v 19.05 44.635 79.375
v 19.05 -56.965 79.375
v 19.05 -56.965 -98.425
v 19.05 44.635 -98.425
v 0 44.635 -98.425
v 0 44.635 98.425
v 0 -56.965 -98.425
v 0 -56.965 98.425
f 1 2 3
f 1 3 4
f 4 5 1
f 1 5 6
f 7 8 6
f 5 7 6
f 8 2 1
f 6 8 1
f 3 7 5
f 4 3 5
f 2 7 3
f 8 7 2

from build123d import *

# Parameters (mm, degrees)
F0_W     = 101.6
F0_H     = 196.85
F1_DEPTH = 19.05
F2_SIZE  = 19.04999


# Not quite as in the source:
# - a fillet or chamfer is up to 0.001 mm smaller than in the source, because OpenCascade refuses the exact size


with BuildPart() as f1:
    # F0 (on Right) → F1 (new body)
    with BuildSketch(Plane.YZ):
        with Locations((-6.1650511805, 0)):
            Rectangle(F0_W, F0_H)
    extrude(amount=F1_DEPTH)

    # F2 (size 19.05 in the source; OpenCascade refuses exactly that, so slightly less here)
    f2_edges = [f1.edges().sort_by_distance(p)[0] for p in [
        (19.05, -6.165051, 98.425),
    ]]
    chamfer(f2_edges, length=F2_SIZE)


solid = f1.part
